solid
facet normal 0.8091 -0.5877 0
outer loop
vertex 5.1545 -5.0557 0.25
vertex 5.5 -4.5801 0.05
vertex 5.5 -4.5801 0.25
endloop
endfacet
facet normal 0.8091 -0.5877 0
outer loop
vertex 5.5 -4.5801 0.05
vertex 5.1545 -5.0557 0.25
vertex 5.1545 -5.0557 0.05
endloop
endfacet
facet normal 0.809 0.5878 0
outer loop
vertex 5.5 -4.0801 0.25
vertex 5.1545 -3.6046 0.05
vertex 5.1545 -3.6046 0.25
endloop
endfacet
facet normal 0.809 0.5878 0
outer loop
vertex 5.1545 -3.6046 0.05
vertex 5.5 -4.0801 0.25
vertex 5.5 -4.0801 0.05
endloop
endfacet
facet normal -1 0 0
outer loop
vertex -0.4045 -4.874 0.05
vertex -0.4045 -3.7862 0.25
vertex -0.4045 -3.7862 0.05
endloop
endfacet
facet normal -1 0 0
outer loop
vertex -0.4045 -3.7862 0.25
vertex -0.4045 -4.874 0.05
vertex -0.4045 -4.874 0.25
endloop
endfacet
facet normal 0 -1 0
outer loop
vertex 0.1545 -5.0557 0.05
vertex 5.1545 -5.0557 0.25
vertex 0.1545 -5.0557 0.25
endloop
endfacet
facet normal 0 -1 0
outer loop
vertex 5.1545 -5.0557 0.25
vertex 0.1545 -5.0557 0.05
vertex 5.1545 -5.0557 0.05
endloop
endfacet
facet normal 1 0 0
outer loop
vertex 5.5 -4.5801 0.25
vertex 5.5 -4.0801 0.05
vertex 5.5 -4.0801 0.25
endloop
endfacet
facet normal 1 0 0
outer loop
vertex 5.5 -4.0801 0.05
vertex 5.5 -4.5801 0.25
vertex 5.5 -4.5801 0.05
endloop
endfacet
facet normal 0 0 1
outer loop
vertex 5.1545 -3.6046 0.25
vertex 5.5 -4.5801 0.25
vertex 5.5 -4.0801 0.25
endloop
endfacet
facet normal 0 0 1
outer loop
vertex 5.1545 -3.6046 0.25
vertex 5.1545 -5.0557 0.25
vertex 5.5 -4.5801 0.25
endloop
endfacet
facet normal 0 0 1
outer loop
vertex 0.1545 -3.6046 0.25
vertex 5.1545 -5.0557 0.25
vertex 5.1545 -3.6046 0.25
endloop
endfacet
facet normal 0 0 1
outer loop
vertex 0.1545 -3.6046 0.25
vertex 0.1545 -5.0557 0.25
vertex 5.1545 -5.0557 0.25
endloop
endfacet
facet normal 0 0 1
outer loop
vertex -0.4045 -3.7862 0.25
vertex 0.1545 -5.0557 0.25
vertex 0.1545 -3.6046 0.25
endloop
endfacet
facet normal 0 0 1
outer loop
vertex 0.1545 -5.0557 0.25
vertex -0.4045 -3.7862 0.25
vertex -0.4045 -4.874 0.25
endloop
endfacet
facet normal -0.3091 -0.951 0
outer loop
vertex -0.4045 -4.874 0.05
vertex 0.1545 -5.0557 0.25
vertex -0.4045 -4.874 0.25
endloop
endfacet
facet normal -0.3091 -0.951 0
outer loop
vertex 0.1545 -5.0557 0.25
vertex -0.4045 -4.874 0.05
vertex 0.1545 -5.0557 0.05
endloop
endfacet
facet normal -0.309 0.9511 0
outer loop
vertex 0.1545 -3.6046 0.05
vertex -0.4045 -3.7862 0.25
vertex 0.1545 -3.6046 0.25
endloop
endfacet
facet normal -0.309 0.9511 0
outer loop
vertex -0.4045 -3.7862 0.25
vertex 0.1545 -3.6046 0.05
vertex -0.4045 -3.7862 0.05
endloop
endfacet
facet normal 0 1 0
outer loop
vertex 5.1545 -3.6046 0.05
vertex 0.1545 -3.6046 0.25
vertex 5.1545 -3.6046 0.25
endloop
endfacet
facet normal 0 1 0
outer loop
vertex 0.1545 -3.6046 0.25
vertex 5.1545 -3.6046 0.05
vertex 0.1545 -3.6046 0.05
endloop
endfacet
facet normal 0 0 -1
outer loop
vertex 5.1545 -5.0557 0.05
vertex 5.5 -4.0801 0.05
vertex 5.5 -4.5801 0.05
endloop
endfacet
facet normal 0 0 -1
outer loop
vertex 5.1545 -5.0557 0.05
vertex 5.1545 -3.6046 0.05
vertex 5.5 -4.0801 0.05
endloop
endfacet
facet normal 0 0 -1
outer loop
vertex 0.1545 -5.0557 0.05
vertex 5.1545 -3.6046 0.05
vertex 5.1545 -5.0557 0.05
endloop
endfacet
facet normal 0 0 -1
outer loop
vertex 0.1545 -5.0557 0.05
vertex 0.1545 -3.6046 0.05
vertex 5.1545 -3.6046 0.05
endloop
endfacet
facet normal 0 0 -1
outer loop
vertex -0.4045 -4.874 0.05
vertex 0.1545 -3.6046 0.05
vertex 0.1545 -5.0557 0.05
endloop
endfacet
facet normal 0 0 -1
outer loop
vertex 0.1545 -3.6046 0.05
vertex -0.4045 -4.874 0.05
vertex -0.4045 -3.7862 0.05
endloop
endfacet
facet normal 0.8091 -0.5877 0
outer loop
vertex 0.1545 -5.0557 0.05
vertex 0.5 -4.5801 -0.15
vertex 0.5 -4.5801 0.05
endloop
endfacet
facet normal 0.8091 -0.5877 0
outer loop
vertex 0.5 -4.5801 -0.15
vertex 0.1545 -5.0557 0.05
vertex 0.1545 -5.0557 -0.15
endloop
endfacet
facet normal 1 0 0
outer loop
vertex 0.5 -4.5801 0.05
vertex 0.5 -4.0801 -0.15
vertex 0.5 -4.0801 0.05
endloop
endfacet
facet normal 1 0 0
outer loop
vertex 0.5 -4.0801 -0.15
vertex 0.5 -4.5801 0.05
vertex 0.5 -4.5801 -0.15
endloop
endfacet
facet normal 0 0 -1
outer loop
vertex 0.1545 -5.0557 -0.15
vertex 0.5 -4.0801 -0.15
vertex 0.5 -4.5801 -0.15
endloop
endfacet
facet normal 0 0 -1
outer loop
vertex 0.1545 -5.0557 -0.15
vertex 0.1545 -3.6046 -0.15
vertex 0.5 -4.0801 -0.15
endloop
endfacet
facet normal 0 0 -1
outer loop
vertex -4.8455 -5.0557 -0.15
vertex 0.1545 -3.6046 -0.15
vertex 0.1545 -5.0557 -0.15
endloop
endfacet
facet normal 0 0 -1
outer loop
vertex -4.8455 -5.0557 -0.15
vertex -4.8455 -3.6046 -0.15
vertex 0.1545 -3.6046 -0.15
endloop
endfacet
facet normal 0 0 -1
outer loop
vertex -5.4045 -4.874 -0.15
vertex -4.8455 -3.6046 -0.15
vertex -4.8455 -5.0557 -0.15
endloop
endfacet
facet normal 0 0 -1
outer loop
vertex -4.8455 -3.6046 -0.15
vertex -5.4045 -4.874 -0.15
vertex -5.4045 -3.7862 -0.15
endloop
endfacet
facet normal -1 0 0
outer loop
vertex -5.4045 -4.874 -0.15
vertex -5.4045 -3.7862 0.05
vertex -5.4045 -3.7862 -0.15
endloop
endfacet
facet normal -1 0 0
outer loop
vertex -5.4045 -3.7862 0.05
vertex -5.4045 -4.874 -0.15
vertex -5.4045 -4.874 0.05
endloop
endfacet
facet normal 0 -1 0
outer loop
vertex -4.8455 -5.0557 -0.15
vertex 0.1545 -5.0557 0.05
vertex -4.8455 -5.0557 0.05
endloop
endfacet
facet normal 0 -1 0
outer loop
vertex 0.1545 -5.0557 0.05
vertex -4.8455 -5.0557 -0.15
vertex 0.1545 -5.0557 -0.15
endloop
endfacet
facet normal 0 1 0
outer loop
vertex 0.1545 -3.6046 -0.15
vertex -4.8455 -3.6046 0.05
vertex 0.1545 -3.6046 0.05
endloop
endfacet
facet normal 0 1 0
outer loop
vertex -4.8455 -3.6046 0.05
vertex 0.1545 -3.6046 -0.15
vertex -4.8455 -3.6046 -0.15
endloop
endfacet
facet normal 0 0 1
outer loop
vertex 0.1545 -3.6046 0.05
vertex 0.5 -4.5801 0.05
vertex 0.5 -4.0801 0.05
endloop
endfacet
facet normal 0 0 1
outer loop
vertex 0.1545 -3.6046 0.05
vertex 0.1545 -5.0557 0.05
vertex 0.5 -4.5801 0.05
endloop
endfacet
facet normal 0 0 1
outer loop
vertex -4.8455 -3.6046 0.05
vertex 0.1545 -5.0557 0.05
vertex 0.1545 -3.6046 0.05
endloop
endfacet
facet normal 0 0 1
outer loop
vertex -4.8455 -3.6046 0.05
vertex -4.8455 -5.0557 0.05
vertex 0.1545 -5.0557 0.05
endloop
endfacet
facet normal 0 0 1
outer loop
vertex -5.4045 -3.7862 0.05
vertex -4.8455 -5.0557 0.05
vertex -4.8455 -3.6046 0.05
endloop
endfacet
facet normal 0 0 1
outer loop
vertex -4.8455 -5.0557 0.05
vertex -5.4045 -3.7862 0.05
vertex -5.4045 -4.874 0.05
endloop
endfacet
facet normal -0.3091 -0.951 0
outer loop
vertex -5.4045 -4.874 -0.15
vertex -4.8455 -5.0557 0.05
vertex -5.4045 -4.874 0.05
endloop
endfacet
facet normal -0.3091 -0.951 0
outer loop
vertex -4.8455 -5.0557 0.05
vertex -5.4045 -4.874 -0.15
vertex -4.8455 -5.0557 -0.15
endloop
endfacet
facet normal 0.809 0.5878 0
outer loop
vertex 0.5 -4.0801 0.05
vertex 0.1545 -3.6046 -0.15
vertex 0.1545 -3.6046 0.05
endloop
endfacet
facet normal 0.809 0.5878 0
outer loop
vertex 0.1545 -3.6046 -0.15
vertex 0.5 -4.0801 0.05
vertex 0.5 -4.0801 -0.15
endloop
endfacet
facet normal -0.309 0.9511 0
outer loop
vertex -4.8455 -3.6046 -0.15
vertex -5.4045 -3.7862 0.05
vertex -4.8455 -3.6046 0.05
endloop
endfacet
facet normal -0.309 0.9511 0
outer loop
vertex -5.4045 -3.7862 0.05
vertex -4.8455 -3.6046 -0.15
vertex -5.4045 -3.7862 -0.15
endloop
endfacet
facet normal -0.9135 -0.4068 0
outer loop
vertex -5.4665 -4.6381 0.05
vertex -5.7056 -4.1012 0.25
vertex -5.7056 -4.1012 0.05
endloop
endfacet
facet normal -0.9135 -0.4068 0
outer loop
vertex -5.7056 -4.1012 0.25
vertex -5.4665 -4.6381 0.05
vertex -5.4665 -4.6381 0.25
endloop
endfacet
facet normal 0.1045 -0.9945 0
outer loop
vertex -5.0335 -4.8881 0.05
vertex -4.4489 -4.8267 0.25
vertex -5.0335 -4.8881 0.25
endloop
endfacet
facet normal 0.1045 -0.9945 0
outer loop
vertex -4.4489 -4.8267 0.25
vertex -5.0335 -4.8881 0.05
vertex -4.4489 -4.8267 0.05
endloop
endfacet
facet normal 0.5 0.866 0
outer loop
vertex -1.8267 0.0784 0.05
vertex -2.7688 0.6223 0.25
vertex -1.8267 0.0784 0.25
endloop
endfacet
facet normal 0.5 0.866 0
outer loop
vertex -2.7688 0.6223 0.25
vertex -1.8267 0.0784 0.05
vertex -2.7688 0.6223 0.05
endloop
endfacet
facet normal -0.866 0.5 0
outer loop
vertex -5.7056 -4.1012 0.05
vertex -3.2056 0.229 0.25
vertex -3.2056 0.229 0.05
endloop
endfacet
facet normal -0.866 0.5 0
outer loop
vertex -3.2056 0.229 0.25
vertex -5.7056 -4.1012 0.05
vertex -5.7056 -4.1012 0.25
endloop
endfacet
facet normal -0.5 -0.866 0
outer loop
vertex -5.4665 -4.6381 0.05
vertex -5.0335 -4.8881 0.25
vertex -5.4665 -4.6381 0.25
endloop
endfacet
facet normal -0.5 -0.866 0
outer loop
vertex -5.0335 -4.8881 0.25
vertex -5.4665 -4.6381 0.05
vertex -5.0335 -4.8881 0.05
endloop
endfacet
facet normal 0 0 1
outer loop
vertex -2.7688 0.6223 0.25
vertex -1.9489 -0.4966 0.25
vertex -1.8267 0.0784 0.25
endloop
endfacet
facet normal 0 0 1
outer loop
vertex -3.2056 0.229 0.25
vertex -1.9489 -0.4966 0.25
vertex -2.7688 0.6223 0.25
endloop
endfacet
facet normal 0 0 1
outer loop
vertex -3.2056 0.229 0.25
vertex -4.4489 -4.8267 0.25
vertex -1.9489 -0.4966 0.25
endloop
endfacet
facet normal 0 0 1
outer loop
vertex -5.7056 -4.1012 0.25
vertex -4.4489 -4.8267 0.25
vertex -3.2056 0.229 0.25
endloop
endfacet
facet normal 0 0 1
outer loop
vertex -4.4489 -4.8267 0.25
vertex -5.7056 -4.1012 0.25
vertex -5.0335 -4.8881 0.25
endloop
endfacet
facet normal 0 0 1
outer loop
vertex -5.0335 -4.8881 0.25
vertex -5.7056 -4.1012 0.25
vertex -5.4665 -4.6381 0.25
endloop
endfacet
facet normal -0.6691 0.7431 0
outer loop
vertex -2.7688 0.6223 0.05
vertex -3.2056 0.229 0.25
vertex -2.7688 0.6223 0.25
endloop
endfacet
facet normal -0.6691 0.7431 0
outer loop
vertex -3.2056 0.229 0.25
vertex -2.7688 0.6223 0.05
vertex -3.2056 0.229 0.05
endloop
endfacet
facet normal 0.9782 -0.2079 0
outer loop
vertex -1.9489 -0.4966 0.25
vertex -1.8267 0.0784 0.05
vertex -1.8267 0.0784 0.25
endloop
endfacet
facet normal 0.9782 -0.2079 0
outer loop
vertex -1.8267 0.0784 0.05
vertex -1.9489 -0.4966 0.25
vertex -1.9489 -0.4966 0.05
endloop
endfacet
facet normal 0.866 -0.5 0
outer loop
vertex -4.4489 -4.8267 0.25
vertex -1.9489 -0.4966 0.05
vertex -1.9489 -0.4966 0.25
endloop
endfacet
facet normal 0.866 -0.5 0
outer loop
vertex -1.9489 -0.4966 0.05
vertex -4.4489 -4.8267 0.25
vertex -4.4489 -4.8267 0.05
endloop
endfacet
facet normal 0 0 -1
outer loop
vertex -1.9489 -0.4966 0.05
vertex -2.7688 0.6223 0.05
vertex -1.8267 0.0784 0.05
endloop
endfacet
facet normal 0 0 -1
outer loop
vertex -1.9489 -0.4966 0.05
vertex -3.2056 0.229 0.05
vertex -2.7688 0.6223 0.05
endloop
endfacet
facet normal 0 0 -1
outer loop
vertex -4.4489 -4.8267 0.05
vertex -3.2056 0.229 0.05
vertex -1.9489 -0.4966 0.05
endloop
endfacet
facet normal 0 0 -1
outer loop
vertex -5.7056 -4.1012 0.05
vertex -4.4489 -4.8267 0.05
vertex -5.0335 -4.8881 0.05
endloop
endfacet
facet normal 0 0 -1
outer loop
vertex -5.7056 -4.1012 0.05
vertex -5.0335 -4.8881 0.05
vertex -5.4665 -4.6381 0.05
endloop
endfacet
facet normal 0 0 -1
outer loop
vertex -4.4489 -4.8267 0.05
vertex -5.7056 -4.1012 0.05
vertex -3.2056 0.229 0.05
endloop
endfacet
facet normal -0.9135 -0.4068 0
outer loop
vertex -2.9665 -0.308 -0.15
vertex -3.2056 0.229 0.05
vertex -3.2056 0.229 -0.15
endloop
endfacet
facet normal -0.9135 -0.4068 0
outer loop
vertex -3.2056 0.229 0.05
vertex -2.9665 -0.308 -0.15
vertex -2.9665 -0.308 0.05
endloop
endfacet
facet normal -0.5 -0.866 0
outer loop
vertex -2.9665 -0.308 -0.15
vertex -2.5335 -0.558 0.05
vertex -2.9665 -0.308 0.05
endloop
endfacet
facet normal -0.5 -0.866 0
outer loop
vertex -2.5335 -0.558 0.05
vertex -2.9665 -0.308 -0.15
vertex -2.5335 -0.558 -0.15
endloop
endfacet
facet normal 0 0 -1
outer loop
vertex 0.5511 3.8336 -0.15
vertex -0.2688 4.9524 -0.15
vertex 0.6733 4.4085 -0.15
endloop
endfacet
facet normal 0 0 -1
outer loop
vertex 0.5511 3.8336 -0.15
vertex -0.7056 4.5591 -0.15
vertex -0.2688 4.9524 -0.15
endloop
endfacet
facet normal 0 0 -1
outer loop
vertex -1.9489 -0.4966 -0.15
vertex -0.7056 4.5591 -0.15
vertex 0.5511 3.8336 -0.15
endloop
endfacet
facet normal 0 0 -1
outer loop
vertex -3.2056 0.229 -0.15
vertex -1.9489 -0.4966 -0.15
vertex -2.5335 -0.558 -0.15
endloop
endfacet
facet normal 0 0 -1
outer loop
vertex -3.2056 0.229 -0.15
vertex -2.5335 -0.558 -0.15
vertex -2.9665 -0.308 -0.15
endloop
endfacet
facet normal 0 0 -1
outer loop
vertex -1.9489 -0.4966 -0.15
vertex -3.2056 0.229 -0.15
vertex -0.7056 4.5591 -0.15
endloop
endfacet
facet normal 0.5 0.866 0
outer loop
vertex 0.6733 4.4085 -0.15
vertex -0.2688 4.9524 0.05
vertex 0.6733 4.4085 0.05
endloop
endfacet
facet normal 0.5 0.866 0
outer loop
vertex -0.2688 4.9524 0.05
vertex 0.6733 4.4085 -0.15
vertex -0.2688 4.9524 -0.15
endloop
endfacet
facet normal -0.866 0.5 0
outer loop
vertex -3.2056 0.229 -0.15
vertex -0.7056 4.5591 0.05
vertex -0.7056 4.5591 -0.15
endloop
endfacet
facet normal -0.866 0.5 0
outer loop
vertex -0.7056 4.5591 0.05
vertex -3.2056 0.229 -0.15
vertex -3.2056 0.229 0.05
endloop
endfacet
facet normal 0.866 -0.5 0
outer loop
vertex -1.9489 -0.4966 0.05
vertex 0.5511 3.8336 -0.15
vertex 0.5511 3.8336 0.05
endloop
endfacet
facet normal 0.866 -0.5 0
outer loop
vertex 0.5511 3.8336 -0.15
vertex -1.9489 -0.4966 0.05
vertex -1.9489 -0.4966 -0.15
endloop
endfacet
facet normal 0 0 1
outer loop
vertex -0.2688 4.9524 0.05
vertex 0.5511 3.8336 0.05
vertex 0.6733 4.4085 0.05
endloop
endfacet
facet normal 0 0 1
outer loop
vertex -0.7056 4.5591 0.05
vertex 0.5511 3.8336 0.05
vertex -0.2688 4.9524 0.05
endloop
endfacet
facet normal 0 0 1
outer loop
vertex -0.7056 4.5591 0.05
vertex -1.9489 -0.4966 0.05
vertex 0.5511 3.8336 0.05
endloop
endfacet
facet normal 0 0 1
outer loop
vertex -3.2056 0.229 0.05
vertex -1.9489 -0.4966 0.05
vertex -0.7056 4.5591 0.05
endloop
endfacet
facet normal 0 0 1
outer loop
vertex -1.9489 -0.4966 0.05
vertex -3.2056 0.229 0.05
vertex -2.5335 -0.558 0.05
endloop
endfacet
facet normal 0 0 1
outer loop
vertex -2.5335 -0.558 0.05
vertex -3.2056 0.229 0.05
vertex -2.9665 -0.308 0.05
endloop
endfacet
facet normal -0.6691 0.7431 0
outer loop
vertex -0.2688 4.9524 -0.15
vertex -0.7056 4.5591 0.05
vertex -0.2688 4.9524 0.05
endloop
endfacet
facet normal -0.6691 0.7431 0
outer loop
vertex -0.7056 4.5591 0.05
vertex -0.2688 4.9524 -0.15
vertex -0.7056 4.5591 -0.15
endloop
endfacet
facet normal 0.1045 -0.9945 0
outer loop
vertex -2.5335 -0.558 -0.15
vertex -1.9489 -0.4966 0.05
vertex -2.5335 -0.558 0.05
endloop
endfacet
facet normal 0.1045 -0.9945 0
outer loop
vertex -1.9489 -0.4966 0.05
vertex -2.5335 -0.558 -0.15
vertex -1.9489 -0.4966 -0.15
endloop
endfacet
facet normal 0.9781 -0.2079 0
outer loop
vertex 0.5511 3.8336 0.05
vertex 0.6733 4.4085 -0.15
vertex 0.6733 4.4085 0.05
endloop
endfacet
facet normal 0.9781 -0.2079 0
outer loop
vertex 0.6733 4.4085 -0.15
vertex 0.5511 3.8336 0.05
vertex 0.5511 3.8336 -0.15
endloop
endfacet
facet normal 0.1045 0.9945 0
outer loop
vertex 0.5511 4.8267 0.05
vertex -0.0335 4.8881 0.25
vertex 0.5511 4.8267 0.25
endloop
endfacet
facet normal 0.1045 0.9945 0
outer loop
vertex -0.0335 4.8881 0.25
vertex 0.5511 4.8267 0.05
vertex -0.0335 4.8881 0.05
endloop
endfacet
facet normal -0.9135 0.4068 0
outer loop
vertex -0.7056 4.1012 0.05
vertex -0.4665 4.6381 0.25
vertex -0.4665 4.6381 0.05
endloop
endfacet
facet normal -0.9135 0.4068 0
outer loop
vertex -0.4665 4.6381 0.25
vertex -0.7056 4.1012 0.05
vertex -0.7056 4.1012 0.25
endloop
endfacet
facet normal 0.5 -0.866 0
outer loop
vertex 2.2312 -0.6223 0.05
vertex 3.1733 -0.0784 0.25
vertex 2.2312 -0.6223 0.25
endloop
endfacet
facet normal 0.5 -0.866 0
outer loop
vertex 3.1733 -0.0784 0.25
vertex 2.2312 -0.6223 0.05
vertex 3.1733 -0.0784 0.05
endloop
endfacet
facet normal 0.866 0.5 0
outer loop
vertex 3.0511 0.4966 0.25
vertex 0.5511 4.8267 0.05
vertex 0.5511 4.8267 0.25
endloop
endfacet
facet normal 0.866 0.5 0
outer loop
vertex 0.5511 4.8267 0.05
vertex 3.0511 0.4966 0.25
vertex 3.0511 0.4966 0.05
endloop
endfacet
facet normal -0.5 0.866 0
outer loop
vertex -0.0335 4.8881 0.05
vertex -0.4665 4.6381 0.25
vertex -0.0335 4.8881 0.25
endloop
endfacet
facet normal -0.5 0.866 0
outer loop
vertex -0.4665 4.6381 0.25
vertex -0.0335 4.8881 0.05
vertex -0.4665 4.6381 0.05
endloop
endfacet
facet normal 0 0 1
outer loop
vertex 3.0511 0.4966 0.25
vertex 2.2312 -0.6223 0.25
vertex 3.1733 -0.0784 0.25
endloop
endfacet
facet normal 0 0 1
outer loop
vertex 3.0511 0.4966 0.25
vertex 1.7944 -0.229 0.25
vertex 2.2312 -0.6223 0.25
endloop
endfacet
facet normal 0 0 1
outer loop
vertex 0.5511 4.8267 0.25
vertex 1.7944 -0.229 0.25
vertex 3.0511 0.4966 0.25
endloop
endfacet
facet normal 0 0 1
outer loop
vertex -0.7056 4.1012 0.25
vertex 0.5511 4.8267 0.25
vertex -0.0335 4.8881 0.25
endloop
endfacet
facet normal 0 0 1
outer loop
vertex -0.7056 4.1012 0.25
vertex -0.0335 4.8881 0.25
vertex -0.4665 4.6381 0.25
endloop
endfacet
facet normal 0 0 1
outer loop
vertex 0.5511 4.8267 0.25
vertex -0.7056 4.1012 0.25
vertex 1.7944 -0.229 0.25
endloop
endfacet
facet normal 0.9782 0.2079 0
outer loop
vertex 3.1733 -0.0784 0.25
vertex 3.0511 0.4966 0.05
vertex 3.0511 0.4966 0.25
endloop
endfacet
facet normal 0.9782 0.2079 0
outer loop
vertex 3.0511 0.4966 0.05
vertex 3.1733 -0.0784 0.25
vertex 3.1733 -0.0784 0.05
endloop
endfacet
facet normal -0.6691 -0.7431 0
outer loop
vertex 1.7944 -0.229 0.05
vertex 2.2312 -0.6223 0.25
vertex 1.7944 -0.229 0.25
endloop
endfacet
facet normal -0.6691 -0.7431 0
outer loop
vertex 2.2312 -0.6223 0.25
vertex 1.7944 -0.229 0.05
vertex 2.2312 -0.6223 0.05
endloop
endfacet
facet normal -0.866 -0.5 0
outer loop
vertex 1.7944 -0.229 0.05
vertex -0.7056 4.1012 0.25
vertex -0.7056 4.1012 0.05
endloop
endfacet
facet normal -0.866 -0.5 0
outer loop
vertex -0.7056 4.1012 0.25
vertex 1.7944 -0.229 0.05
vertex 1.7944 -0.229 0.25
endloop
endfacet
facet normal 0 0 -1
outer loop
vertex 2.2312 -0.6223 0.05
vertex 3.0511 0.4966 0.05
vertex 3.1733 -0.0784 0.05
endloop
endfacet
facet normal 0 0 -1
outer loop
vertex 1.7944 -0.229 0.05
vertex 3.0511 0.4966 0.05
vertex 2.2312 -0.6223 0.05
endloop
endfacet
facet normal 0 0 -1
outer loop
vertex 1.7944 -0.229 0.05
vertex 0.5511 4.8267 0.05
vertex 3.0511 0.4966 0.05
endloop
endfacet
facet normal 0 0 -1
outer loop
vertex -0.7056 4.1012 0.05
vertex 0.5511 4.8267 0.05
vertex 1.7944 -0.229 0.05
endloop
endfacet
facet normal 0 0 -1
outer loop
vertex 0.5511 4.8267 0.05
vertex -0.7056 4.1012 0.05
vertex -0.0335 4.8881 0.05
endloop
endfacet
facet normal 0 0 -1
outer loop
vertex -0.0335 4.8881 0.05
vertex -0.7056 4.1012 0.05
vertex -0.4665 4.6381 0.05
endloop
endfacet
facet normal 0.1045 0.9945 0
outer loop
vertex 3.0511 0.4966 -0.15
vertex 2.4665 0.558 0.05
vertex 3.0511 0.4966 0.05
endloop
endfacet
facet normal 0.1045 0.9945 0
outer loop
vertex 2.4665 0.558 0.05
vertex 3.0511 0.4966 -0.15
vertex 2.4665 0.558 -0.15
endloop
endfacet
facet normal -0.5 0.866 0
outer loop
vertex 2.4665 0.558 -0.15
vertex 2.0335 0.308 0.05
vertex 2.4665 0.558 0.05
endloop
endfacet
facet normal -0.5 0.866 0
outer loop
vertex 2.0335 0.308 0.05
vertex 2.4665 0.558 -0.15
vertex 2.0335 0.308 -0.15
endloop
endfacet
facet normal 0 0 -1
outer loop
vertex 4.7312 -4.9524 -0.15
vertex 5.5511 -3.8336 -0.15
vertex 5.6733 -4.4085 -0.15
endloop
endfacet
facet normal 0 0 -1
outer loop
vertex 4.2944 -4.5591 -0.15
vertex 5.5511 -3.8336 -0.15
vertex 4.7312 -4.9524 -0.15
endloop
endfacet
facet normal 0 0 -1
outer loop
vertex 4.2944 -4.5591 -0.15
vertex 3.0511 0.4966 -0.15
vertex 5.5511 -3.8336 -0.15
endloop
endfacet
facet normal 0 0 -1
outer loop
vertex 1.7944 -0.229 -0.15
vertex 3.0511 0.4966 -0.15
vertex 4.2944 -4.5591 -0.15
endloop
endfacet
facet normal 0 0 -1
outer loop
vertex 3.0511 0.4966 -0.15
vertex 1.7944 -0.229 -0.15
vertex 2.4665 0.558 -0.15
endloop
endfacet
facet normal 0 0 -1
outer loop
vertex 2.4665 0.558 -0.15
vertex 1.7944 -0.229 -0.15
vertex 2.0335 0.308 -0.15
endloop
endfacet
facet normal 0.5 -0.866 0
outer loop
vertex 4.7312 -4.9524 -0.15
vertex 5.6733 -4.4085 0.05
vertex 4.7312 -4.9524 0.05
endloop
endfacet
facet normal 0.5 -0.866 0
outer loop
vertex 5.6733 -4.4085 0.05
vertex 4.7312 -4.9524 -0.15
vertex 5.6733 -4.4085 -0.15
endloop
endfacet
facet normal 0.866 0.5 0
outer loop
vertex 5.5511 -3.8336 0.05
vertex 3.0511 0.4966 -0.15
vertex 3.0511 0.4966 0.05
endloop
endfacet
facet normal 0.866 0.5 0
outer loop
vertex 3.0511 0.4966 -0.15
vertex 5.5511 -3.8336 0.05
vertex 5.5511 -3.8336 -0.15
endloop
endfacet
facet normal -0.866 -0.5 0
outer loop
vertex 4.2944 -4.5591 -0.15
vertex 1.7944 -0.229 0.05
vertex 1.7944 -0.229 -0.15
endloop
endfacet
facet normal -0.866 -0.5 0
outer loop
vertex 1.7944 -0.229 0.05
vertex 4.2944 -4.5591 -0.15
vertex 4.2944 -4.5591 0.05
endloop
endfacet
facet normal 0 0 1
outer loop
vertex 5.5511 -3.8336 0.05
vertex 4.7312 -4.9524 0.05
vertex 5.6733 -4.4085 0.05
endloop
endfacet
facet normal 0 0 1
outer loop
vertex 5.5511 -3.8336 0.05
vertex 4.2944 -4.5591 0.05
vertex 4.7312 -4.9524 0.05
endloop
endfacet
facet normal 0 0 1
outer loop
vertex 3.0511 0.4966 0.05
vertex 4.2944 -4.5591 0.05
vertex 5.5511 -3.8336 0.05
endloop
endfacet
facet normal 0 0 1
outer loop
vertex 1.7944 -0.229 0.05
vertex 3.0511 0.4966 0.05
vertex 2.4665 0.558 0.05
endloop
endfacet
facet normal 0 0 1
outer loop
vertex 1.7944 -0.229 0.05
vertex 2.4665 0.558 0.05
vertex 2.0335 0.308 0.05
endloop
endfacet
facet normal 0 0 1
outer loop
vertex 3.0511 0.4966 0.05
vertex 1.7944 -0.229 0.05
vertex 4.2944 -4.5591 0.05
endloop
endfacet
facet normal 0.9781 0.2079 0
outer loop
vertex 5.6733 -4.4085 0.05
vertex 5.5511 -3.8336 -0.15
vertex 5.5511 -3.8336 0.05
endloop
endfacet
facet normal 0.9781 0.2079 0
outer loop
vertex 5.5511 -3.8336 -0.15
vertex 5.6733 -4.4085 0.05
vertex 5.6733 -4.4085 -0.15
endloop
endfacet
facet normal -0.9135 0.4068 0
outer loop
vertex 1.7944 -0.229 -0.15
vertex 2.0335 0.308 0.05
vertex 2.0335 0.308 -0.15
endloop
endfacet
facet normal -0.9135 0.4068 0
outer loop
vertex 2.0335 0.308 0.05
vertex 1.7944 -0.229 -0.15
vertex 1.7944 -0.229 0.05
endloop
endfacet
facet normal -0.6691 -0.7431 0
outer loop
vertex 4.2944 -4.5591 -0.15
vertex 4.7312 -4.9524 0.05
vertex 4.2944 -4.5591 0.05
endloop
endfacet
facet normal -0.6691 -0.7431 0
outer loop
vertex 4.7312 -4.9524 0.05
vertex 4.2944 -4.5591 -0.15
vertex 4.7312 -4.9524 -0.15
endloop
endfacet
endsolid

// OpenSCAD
// This is a simple three linkage assembly.
// Its primary purpose is to develop the 
// geometric assembler.

module bar() {
	minkowski() {
			cube(size=[5.0,0.5,0.1], center=true);
			cylinder(r=0.5, h=0.1);
	}
}

module link() {
	translate([2.5,0,0.1]) {
		bar();
	}
	translate([-2.5,0,-0.1]) {
		bar();
	}
}

color("Red")
translate([0,-sin(60)*5.0,0]) {
	link();
};

color("Blue")
translate([-2.5,0.0,0.0]) {
	rotate(a=-120, v=[0,0,1])
		link();
};

color("Green")
translate([2.5,0.0,0.0]) {
	rotate(a=120, v=[0,0,1])
		link();
};
